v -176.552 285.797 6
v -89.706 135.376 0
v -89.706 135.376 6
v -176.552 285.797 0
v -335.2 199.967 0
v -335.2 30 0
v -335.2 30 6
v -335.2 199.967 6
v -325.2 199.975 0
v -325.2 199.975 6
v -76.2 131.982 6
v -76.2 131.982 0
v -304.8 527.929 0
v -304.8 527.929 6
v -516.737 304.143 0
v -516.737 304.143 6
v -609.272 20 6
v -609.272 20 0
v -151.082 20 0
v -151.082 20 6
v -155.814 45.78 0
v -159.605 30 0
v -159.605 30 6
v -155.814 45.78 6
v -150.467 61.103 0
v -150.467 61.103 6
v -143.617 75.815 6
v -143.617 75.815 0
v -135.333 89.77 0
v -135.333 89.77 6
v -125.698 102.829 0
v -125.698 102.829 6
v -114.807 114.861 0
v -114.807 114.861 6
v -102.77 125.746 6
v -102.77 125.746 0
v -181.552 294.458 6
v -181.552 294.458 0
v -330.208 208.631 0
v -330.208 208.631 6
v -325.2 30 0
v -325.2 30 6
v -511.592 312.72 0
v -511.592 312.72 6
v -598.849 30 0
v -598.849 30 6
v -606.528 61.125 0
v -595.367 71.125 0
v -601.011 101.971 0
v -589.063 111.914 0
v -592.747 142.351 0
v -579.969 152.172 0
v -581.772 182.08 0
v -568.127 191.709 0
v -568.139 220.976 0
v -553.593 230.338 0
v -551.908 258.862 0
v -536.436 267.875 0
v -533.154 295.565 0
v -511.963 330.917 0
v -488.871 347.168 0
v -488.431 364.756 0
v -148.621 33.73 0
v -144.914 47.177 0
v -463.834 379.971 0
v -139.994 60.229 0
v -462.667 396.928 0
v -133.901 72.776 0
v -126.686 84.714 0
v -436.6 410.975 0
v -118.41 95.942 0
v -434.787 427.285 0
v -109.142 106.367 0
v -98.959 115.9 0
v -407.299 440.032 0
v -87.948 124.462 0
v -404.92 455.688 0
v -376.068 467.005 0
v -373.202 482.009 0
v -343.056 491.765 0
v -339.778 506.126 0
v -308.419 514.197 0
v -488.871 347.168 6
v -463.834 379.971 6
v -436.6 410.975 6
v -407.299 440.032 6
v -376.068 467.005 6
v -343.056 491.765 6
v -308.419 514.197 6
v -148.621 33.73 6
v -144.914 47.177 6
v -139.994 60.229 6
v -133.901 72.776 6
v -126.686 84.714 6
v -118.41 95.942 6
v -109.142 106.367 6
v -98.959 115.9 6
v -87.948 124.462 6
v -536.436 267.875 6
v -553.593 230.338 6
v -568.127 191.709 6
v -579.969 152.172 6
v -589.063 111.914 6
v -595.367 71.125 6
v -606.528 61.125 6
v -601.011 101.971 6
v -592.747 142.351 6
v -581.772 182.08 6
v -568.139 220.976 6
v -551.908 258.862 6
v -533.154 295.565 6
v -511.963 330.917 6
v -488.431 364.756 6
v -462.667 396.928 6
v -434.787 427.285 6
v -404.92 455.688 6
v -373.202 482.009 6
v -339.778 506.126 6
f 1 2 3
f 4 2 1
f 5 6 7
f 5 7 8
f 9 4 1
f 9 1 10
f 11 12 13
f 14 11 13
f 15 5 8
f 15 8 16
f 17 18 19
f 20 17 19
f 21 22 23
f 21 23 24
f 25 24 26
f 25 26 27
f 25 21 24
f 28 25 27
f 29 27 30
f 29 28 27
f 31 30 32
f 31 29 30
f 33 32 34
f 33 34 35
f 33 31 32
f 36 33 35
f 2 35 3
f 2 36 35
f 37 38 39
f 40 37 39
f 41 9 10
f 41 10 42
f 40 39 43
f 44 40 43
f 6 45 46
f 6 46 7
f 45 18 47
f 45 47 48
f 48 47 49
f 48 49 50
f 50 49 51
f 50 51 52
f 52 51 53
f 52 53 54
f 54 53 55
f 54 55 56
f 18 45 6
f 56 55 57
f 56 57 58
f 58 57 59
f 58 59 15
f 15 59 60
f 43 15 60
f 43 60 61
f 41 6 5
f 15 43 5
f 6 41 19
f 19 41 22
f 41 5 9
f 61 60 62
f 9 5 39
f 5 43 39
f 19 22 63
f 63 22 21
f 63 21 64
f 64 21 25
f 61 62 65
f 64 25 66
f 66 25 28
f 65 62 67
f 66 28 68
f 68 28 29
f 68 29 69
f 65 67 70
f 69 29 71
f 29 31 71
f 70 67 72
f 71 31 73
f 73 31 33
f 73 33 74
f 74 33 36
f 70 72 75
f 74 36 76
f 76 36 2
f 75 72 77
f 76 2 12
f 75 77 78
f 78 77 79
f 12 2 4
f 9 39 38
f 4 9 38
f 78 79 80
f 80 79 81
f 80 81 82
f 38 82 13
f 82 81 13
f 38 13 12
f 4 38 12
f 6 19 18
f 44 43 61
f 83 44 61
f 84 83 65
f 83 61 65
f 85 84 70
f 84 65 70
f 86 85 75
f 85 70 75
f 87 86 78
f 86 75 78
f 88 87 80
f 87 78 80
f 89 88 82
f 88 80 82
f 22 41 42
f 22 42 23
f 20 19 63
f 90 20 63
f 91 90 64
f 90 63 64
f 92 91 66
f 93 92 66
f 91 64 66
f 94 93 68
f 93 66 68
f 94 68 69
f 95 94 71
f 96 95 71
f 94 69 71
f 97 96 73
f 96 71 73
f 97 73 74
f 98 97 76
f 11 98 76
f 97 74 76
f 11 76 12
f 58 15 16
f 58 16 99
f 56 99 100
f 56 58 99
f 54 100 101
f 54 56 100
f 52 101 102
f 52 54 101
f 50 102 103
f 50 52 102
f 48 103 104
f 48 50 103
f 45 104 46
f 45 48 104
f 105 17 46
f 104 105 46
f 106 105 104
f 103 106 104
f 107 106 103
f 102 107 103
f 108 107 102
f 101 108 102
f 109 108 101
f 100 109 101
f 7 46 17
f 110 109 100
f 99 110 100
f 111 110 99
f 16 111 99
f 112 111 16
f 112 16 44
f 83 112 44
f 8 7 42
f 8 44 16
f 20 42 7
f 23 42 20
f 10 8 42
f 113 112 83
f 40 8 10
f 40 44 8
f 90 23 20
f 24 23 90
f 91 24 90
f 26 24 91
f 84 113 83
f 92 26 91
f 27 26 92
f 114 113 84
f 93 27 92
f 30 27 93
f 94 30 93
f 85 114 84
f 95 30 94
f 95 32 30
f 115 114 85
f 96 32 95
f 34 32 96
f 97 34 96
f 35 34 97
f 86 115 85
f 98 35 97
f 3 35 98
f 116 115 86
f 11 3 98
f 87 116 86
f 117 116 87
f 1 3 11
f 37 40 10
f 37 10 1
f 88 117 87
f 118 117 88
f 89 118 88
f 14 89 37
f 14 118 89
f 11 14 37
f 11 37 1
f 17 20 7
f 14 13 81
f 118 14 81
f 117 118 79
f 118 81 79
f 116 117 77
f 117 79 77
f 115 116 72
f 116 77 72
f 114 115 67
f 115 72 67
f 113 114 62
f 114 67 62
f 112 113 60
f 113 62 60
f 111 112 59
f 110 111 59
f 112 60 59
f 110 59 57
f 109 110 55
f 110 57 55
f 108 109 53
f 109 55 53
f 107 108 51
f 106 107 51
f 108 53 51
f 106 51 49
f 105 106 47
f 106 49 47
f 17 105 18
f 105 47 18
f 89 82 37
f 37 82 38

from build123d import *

# Parameters (mm, degrees)
BOSS_EXTRUDE1_DEPTH = 6


with BuildPart() as part:
    # Sketch1 → Boss-Extrude1 (new body)
    with BuildSketch(Plane.XY):
        with BuildLine():
            Line((-76.2, 131.982271537), (-304.8, 527.929086147))
            ThreePointArc((-304.8, 527.929086147), (-522.857356911, 313.420395513), (-609.271827676, 20))
            Line((-609.271827676, 20), (-151.081964509, 20))
            ThreePointArc((-151.081964509, 20), (-126.685753471, 84.714106662), (-76.2, 131.982271537))
        make_face()
        with BuildLine():
            Line((-335.2, 199.966608393), (-516.736885171, 304.143307511))
            ThreePointArc((-516.736885171, 304.143307511), (-574.388040835, 172.042258023), (-598.849029389, 30))
            Line((-598.849029389, 30), (-335.2, 30))
            Line((-335.2, 30), (-335.2, 199.966608393))
        make_face(mode=Mode.SUBTRACT)
        with BuildLine():
            Line((-330.207563047, 208.631242188), (-511.591783696, 312.720333293))
            ThreePointArc((-511.591783696, 312.720333293), (-422.199493266, 425.755502473), (-308.418556675, 514.196610158))
            Line((-308.418556675, 514.196610158), (-181.552122678, 294.457500701))
            Line((-181.552122678, 294.457500701), (-330.207563047, 208.631242188))
        make_face(mode=Mode.SUBTRACT)
        with BuildLine():
            Line((-89.706166951, 135.375638912), (-176.552122678, 285.797246663))
            Line((-176.552122678, 285.797246663), (-325.2, 199.975354677))
            Line((-325.2, 199.975354677), (-325.2, 30))
            Line((-325.2, 30), (-159.605012453, 30))
            ThreePointArc((-159.605012453, 30), (-135.333005446, 89.770471966), (-89.706166951, 135.375638912))
        make_face(mode=Mode.SUBTRACT)
    extrude(amount=BOSS_EXTRUDE1_DEPTH)


solid = part.part
